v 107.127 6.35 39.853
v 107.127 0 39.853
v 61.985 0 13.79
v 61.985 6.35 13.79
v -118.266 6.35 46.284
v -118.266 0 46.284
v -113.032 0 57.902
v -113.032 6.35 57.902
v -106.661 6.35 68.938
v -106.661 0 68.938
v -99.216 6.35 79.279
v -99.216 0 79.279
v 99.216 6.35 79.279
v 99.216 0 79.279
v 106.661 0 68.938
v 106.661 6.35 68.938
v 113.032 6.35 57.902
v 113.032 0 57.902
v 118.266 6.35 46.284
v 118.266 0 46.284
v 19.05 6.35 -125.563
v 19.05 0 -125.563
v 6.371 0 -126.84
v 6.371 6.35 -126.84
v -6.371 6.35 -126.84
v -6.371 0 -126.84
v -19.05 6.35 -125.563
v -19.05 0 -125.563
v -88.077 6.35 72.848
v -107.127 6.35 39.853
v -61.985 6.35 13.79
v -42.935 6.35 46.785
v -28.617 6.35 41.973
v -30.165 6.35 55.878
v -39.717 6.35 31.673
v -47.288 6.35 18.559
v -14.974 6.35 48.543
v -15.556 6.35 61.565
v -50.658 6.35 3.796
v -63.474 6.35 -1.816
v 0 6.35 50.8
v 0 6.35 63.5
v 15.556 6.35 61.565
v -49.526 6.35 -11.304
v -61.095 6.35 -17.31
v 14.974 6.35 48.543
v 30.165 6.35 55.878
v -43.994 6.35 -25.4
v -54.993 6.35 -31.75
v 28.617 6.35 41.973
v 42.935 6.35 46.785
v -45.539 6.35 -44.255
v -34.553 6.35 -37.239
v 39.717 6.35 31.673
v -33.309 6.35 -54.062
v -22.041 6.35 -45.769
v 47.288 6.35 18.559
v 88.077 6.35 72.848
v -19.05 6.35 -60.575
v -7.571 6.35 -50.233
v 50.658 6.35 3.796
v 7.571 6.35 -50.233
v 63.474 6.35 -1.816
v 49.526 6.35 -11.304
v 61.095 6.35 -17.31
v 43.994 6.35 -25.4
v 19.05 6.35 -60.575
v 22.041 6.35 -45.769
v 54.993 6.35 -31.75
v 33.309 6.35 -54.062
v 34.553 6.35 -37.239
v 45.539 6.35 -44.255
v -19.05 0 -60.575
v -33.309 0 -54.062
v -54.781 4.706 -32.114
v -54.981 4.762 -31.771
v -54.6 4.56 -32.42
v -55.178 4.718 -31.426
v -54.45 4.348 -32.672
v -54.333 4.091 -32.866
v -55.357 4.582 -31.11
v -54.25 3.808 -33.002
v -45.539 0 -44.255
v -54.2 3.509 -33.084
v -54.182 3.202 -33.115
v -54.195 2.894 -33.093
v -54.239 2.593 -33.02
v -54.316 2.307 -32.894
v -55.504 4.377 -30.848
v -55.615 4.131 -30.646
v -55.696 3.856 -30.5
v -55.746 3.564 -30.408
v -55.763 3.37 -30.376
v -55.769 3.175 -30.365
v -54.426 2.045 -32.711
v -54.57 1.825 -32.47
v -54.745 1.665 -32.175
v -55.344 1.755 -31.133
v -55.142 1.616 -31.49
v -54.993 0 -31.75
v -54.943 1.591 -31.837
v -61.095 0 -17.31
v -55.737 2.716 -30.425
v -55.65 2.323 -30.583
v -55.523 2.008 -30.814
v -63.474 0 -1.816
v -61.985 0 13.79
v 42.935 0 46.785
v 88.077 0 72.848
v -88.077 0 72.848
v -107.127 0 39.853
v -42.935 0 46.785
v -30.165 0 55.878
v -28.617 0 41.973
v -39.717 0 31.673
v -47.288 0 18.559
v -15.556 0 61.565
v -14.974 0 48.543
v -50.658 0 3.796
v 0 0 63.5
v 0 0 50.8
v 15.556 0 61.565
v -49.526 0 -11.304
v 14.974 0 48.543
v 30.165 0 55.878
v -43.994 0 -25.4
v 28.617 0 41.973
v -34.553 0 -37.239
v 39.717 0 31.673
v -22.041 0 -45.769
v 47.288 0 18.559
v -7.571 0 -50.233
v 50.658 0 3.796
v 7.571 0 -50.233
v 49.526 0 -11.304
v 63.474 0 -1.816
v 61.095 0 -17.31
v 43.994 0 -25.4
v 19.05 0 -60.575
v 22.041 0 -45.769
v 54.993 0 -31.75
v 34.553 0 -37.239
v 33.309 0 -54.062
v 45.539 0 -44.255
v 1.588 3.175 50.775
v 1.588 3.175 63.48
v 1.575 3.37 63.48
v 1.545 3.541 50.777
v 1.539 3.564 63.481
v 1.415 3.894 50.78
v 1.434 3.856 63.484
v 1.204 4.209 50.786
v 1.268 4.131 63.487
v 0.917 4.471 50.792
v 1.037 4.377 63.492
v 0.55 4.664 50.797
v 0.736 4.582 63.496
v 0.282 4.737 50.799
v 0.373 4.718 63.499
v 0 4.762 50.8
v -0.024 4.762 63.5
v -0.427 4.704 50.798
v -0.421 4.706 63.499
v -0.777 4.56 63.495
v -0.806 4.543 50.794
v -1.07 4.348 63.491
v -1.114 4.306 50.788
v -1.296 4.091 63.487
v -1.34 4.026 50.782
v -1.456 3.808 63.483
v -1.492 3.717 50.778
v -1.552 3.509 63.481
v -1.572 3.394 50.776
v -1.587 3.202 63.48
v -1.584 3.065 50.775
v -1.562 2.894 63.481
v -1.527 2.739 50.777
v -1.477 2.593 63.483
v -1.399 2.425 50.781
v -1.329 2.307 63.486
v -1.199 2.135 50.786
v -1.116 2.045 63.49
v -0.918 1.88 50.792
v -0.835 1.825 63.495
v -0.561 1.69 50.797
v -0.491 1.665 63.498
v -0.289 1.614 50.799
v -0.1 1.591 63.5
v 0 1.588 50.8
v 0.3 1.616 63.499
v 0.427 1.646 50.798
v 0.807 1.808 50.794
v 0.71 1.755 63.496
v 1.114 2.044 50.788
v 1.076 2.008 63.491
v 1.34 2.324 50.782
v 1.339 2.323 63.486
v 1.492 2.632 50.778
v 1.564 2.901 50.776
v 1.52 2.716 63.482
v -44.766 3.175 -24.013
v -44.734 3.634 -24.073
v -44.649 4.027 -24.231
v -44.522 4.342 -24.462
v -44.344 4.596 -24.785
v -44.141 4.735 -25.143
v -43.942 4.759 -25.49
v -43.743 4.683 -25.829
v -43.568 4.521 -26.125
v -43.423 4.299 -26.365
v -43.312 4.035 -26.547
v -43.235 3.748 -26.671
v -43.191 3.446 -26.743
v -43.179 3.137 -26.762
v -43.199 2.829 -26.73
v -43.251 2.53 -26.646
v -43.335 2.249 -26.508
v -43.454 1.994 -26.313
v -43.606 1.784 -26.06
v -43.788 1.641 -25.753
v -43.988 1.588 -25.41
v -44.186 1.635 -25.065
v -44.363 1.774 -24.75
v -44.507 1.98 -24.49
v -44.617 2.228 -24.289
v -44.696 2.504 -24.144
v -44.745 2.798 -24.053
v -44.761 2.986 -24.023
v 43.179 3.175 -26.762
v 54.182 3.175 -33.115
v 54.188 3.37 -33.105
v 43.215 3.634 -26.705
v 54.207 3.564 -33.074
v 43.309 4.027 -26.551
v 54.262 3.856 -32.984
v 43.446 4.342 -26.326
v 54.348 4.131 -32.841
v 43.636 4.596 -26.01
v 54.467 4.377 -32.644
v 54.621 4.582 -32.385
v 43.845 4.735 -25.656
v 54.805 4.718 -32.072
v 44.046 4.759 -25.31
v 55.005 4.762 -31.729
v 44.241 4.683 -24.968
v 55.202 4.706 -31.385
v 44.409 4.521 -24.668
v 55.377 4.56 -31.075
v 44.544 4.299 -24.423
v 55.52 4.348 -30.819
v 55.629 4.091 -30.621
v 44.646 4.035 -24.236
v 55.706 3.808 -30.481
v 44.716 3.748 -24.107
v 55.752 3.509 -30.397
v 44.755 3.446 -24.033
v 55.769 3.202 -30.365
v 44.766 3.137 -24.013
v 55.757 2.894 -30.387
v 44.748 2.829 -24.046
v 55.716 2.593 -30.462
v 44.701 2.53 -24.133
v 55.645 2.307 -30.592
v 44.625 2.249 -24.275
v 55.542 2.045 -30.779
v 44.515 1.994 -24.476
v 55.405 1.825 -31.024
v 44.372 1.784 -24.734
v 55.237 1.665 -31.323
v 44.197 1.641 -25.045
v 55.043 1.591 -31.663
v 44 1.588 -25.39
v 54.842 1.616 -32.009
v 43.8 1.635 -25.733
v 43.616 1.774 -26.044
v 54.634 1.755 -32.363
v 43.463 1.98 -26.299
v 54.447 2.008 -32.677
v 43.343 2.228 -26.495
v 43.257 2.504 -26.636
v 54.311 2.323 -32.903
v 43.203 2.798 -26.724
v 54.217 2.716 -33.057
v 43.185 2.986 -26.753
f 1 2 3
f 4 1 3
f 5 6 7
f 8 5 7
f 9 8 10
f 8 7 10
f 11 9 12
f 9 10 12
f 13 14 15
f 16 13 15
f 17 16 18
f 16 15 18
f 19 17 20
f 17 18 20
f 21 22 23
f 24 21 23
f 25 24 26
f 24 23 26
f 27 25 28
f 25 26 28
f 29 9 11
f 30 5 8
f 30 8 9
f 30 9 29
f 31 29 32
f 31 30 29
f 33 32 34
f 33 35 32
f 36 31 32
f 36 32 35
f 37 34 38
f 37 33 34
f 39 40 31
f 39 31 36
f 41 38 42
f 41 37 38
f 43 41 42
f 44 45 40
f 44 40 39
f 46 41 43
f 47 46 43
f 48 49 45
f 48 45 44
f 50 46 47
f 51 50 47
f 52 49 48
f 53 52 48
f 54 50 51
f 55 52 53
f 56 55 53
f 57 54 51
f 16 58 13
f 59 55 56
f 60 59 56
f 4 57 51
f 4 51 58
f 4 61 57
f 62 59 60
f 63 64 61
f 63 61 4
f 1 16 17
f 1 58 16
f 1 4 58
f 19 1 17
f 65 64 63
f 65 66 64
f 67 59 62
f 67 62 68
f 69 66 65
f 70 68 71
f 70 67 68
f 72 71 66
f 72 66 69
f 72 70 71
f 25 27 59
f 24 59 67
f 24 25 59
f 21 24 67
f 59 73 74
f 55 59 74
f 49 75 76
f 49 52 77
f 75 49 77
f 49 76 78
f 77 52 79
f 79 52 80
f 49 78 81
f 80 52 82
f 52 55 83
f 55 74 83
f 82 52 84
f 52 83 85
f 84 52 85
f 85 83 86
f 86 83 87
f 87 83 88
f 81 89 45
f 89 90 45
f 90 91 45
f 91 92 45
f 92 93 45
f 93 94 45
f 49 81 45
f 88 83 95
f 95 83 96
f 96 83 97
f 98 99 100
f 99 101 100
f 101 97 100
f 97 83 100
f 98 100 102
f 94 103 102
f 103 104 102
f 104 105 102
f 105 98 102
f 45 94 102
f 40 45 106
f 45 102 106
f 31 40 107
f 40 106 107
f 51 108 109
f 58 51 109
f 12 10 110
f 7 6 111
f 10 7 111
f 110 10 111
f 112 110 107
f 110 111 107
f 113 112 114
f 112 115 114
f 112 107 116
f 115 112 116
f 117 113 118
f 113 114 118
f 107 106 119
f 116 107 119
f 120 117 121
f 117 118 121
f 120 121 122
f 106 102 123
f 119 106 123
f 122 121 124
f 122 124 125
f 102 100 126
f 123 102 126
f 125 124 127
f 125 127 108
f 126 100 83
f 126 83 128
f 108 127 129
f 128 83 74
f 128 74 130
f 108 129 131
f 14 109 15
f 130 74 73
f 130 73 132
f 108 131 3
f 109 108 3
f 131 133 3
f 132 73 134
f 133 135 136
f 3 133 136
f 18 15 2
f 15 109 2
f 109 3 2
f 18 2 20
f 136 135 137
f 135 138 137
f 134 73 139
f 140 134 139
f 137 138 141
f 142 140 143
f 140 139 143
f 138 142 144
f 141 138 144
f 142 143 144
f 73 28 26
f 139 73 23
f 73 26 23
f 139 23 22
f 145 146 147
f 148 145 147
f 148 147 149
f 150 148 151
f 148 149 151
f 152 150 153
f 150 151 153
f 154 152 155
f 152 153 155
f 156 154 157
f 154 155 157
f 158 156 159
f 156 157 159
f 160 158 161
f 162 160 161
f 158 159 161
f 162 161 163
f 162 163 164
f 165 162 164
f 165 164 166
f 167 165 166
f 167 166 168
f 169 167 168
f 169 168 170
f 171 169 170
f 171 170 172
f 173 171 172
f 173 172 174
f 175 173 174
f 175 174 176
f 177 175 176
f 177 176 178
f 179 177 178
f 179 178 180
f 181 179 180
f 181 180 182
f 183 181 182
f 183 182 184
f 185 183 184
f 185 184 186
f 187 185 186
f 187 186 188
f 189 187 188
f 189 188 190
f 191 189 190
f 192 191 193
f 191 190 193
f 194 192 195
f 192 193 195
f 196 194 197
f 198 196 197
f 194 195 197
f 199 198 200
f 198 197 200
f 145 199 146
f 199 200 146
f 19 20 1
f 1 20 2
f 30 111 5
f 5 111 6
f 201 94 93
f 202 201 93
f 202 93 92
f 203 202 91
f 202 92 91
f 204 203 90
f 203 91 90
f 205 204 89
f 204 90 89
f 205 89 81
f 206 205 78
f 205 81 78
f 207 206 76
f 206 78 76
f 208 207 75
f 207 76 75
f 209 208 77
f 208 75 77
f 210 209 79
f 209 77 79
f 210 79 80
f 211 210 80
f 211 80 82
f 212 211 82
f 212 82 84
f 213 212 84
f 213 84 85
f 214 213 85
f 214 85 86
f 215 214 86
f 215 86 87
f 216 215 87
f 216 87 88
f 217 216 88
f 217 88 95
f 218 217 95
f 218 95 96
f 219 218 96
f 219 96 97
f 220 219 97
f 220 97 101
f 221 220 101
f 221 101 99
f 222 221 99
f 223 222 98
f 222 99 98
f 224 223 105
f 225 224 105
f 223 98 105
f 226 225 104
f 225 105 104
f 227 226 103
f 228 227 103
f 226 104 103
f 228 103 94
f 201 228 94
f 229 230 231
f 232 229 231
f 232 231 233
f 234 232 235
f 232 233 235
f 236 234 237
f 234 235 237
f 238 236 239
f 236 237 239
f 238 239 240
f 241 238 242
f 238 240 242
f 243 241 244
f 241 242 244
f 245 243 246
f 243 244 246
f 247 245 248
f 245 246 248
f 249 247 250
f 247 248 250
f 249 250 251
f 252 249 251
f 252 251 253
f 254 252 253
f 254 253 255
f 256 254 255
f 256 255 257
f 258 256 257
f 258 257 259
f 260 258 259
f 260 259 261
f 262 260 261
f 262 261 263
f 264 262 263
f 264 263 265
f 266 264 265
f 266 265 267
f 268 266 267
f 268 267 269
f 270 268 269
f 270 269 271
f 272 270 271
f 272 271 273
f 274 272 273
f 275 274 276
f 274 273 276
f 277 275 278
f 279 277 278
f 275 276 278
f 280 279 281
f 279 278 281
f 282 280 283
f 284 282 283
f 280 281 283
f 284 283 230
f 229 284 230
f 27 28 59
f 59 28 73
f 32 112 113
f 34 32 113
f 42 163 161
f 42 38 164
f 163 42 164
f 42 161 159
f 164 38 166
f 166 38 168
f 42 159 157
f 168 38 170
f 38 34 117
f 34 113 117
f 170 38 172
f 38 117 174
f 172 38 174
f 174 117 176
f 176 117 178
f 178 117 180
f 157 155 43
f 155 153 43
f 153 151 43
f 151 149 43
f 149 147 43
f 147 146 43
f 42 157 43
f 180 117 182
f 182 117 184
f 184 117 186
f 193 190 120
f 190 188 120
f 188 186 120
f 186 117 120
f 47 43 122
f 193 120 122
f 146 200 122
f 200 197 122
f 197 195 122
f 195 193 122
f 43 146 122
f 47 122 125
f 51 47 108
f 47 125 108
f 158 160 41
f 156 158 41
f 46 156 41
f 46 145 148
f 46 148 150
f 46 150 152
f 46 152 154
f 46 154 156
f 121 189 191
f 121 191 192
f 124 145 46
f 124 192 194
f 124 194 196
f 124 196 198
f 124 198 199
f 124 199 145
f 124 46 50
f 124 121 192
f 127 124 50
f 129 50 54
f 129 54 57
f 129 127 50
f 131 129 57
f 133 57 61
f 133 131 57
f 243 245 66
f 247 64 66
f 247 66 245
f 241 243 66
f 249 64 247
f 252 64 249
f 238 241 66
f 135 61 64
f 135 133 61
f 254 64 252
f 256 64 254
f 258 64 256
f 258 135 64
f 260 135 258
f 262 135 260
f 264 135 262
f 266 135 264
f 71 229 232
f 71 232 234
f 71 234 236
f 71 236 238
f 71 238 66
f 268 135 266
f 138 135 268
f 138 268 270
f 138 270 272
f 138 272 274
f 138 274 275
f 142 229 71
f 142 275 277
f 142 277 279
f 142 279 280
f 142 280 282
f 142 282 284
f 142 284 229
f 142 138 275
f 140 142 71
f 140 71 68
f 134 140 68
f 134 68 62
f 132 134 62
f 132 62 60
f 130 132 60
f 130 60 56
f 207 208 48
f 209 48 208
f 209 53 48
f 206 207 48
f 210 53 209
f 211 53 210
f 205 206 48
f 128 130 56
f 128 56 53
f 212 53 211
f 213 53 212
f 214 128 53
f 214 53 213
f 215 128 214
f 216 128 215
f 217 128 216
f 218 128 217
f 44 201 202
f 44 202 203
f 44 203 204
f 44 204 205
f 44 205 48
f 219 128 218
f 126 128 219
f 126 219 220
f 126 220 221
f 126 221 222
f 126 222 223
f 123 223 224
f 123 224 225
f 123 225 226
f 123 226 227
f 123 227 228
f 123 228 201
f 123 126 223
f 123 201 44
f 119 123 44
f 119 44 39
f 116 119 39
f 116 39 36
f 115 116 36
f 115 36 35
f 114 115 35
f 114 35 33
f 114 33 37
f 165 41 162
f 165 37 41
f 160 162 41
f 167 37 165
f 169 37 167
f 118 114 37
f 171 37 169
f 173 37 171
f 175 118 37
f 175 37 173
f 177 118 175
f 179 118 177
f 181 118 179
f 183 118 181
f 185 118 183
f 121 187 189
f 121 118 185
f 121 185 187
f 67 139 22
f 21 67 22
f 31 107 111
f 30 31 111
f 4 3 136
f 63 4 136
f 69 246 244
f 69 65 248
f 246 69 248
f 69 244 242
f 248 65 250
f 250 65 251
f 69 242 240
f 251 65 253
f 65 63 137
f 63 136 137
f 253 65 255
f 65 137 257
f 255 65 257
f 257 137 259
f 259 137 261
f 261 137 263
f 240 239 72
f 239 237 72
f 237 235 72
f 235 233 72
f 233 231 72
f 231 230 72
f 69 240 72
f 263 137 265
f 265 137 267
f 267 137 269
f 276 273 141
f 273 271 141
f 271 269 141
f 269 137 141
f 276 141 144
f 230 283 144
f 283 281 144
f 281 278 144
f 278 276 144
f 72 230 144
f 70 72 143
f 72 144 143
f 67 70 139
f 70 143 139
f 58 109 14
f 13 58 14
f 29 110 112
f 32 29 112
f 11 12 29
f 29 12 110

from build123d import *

# Parameters (mm, degrees)
SKETCH1_R           = 50.8
BOSS_EXTRUDE1_DEPTH = 6.35
SKETCH2_R           = 1.5875
CUT_EXTRUDE1_DEPTH  = 12.724811
CIRPATTERN1_COUNT   = 3


with BuildPart() as part:
    # Sketch1 → Boss-Extrude1 (new body)
    with BuildSketch(Plane(origin=(0, 0, 0), x_dir=(1, 0, 0), z_dir=(0, 1, 0))):
        with BuildLine():
            Line((-19.05, 112.701319868), (-19.05, 60.57513929))
            ThreePointArc((-19.05, 60.57513929), (-54.99261314, 31.75), (-61.984609463, -13.789785703))
            Line((-61.984609463, -13.789785703), (-107.127206046, -39.852875992))
            Line((-107.127206046, -39.852875992), (-118.265853064, -46.283776846))
            ThreePointArc((-118.265853064, -46.283776846), (-109.985226281, -63.5), (-99.215853064, -79.27934473))
            Line((-99.215853064, -79.27934473), (-88.077206046, -72.848443876))
            Line((-88.077206046, -72.848443876), (-42.934609463, -46.785353587))
            ThreePointArc((-42.934609463, -46.785353587), (0, -63.5), (42.934609463, -46.785353587))
            Line((42.934609463, -46.785353587), (88.077206046, -72.848443876))
            Line((88.077206046, -72.848443876), (99.215853064, -79.27934473))
            ThreePointArc((99.215853064, -79.27934473), (109.985226281, -63.5), (118.265853064, -46.283776846))
            Line((118.265853064, -46.283776846), (107.127206046, -39.852875992))
            Line((107.127206046, -39.852875992), (61.984609463, -13.789785703))
            ThreePointArc((61.984609463, -13.789785703), (54.99261314, 31.75), (19.05, 60.57513929))
            Line((19.05, 60.57513929), (19.05, 112.701319868))
            Line((19.05, 112.701319868), (19.05, 125.563121576))
            ThreePointArc((19.05, 125.563121576), (0, 127), (-19.05, 125.563121576))
            Line((-19.05, 125.563121576), (-19.05, 112.701319868))
        make_face()
        with Locations(Location((0, 0, 0), (0, 0, 270))):  # turned: the seam where the file's is
            Circle(SKETCH1_R, mode=Mode.SUBTRACT)
    extrude(amount=BOSS_EXTRUDE1_DEPTH)

    # Sketch2 → Cut-Extrude1 (cut)
    with BuildSketch(Plane.XY.offset(63.5)):
        with Locations((0, 3.175)):
            Circle(SKETCH2_R)
    cut_extrude1 = extrude(amount=-CUT_EXTRUDE1_DEPTH, mode=Mode.SUBTRACT)

    # CirPattern1: Cut-Extrude1 ×3 about axis
    cirpattern1_axis = Axis((0, 0, 0), (0, -1, 0))
    for i in range(1, CIRPATTERN1_COUNT):
        add(cut_extrude1.rotate(cirpattern1_axis, i * 360 / CIRPATTERN1_COUNT), mode=Mode.SUBTRACT)


solid = part.part
